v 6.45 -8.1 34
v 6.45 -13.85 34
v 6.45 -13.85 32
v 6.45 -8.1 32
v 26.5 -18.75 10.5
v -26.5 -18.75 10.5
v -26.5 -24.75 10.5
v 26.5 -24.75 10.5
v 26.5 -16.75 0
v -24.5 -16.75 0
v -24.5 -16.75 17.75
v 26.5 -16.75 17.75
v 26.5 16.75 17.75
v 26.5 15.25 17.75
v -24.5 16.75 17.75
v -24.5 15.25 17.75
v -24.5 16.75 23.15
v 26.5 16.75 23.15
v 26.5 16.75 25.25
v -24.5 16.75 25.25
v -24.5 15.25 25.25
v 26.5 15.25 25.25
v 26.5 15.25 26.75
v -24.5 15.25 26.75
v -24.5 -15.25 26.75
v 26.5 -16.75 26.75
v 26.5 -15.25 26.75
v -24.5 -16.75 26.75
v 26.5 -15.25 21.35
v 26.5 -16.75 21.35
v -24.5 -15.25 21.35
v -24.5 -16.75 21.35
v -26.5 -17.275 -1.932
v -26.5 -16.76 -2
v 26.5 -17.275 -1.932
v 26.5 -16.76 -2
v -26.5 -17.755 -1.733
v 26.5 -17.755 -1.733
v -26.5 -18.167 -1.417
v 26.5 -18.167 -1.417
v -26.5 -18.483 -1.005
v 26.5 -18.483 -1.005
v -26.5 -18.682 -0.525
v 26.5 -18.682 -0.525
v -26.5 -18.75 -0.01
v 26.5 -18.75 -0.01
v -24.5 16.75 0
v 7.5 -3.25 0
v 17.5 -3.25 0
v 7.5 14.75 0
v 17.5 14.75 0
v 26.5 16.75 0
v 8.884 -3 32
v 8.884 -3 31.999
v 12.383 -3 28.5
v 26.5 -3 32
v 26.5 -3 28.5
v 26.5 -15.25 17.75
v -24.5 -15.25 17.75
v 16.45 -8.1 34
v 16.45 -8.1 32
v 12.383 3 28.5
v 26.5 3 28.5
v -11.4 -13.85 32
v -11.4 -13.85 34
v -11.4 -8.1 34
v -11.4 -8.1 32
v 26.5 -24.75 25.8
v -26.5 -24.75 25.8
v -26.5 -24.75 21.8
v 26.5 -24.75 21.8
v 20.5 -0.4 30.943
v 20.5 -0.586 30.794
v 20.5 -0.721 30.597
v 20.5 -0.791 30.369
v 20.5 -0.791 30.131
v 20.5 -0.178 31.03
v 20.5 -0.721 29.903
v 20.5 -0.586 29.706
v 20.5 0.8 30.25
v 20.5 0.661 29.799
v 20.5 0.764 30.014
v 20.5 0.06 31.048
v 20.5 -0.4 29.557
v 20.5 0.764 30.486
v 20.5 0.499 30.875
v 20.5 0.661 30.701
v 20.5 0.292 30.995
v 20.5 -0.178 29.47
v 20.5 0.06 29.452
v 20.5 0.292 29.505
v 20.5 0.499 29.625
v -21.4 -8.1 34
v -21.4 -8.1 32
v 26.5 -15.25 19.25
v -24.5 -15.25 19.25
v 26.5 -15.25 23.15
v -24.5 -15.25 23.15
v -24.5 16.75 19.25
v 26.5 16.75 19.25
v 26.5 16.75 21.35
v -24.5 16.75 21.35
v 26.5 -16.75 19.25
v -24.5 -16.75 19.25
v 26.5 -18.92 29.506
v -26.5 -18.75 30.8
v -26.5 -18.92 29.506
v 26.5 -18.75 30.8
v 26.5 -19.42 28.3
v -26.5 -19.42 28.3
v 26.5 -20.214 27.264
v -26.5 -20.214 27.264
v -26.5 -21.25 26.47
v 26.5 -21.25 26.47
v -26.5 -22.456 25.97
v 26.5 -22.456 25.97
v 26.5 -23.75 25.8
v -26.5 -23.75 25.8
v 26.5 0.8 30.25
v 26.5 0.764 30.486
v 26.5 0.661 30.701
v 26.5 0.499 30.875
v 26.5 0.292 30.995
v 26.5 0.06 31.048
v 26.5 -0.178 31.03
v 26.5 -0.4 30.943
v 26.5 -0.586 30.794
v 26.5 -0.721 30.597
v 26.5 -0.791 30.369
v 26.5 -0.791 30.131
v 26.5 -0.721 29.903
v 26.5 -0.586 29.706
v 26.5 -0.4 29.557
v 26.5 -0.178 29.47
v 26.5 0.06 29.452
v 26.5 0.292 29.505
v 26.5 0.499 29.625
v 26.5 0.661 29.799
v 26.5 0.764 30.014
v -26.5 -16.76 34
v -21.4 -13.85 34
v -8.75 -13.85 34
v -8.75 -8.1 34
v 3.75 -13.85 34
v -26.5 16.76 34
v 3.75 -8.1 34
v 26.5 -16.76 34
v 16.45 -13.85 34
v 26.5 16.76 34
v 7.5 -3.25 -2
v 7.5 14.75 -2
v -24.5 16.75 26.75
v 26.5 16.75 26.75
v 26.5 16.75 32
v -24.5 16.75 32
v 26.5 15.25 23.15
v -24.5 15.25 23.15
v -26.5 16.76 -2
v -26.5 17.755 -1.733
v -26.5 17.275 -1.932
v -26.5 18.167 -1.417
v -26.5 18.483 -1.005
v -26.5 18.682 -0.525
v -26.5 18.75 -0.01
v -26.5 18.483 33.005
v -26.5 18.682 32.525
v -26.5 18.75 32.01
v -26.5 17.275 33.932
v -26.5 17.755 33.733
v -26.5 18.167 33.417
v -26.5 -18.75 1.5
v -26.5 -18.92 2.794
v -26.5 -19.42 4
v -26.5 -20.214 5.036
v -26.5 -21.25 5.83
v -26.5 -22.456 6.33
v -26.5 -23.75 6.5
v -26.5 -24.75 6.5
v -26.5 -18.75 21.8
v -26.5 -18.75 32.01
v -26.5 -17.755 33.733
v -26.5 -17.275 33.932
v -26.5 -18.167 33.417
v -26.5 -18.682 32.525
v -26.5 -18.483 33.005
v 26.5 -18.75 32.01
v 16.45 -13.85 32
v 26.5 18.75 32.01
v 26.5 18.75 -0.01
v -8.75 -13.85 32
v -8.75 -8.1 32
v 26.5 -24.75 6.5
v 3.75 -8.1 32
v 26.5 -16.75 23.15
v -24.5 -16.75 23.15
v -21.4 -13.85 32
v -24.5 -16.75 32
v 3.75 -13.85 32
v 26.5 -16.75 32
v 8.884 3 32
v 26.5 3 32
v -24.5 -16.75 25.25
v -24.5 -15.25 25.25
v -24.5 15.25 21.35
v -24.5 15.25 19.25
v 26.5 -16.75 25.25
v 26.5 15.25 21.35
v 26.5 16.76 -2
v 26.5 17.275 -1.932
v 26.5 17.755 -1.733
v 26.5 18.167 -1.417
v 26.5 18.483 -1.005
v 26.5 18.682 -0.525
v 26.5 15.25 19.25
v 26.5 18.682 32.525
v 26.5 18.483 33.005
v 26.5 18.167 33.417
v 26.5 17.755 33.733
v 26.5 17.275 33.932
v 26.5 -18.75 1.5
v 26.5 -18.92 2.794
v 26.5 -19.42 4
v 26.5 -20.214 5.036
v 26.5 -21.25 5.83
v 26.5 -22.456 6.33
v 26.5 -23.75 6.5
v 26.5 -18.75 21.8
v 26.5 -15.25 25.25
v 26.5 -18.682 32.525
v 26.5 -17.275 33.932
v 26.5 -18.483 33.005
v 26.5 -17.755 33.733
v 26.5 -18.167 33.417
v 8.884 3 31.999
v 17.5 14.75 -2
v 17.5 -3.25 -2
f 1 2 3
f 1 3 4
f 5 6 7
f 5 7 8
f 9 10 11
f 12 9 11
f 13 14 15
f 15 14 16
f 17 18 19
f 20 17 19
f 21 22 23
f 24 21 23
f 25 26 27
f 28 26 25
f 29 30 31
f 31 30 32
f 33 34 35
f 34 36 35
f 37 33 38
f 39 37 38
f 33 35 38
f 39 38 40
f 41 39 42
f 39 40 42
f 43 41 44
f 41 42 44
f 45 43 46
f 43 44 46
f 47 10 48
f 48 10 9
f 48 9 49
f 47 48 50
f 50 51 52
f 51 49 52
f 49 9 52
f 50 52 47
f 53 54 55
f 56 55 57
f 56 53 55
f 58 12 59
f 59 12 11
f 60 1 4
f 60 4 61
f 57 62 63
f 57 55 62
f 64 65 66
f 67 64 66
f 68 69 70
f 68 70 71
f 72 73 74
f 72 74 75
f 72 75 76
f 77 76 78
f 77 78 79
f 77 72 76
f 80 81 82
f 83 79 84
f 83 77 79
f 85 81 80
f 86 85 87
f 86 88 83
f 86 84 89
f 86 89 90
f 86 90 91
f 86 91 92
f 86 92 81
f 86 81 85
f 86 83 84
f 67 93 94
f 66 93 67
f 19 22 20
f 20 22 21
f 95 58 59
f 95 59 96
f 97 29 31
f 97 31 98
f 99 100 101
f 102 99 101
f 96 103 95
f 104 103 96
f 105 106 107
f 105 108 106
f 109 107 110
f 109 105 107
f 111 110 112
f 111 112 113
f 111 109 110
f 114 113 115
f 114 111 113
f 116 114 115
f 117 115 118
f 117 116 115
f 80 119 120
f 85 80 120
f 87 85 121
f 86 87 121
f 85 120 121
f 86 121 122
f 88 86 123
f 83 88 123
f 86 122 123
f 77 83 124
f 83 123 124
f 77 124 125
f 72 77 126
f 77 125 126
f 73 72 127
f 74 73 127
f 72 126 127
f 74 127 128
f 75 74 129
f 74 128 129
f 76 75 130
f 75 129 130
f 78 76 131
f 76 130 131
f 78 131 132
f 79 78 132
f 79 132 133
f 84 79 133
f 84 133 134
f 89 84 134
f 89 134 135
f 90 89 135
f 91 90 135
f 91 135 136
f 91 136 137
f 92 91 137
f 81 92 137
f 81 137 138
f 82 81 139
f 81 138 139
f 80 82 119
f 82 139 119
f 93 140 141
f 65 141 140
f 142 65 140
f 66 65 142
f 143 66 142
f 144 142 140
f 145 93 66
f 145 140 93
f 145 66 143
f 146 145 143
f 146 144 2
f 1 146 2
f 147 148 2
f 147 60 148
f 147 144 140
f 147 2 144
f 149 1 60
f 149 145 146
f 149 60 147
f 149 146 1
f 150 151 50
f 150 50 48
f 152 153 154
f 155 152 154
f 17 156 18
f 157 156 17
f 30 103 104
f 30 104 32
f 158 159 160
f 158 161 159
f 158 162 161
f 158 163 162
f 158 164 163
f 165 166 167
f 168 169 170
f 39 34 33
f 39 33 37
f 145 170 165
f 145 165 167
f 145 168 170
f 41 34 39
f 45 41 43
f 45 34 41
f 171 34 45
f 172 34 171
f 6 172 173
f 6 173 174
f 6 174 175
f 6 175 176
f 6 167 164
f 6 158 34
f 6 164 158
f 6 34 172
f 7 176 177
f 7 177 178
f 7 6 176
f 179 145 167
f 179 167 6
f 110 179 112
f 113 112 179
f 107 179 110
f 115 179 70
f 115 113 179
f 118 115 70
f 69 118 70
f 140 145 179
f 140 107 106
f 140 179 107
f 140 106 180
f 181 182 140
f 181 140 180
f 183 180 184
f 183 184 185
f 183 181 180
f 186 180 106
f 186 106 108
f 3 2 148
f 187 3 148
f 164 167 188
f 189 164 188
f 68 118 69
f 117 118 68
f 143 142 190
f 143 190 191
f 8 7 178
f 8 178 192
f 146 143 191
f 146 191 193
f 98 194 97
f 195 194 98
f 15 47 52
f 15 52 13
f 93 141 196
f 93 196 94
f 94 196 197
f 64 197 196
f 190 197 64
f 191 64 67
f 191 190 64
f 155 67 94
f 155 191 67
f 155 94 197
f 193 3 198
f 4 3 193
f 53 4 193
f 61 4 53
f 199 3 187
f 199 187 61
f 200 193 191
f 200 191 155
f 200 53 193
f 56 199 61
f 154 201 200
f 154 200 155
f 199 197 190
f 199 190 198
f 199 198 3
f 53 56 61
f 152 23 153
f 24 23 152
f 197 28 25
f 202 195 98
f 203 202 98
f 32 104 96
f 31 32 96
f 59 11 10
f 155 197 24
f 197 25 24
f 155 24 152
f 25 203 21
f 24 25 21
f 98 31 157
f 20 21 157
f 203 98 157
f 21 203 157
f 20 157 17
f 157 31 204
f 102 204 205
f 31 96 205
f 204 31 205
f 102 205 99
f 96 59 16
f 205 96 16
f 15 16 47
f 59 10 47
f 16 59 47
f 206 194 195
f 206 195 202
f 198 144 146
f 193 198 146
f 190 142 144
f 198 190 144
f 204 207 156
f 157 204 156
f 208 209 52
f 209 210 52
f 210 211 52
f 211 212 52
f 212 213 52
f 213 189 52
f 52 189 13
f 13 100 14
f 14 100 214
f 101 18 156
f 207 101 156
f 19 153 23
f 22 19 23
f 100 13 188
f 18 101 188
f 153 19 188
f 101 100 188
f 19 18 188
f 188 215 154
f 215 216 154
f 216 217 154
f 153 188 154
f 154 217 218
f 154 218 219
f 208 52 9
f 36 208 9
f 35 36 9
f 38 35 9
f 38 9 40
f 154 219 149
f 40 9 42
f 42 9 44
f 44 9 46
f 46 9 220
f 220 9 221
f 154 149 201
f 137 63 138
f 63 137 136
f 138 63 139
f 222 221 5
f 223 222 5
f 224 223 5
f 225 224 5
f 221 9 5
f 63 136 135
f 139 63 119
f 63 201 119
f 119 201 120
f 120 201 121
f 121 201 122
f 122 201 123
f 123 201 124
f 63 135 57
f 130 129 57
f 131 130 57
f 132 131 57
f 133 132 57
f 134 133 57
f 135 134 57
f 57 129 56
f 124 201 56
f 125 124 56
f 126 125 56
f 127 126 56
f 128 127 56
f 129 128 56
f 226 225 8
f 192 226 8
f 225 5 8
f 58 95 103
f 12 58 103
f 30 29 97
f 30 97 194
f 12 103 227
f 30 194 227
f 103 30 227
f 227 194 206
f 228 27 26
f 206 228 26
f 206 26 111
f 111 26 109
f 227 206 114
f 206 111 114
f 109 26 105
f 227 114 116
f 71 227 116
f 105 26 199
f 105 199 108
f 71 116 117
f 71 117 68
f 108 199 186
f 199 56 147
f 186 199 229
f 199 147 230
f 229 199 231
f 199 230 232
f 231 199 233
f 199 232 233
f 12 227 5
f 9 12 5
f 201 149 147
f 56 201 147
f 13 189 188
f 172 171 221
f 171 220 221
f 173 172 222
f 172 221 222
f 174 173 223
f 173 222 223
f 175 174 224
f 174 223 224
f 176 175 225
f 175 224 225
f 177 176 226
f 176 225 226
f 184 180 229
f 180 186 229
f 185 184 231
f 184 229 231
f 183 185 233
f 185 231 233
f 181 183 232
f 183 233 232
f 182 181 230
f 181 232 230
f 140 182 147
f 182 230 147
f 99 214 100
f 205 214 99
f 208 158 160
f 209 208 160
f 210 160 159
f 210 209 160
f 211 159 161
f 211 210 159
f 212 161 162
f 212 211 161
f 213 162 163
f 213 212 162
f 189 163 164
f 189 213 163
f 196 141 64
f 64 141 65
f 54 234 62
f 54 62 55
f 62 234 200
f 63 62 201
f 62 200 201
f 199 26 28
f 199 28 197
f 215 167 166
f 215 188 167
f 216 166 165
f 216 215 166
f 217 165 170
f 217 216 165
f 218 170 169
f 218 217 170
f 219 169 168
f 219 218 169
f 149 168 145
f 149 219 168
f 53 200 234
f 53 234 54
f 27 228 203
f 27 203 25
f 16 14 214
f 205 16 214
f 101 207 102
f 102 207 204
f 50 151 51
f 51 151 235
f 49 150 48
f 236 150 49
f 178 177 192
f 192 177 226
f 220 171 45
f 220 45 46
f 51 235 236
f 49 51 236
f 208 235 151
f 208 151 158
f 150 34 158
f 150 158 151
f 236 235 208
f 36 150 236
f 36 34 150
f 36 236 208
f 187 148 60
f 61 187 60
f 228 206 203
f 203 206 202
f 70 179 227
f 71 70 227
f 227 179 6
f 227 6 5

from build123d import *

# Parameters (mm, degrees)
SKETCH_W        = 53
SKETCH_H        = 37.5
SKETCH_W_2      = 49
SKETCH_H_2      = 33.5
PAD_DEPTH       = 32
SKETCH001_W     = 53
SKETCH001_H     = 37.5
PAD001_DEPTH    = 2
SKETCH002_W     = 53
SKETCH002_H     = 37.5
PAD002_DEPTH    = 2
SKETCH003_W     = 33.5
SKETCH003_H     = 32
POCKET_DEPTH    = 2
SKETCH004_W     = 10
SKETCH004_H     = 5.75
SKETCH004_W_2   = 12.5
SKETCH004_W_3   = 9.9999999999
POCKET001_DEPTH = 5
SKETCH005_W     = 51
SKETCH005_H     = 1.8
SKETCH005_H_2   = 1.5
PAD003_DEPTH    = 33.5
SKETCH006_W     = 30.5
SKETCH006_H     = 9
POCKET002_DEPTH = 51
SKETCH007_W     = 17.616245
SKETCH007_H     = 6
PAD004_DEPTH    = 5
SKETCH008_R     = 0.8
POCKET003_DEPTH = 5
SKETCH009_W     = 17.616245
SKETCH009_H     = 6
PAD005_DEPTH    = 3.5
SKETCH010_R     = 0.8
POCKET004_DEPTH = 6
CHAMFER_SIZE    = 3.499
CHAMFER001_SIZE = 4.99
FILLET_R        = 1.99
SKETCH012_W     = 53
SKETCH012_H     = 4
PAD006_DEPTH    = 6
FILLET001_R     = 5
SKETCH013_W     = 6
SKETCH013_H     = 5
POCKET005_DEPTH = 20
SKETCH014_W     = 10
SKETCH014_H     = 18
POCKET006_DEPTH = 5


with BuildPart() as part:
    # Sketch → Pad (new body)
    with BuildSketch(Plane.XY):
        Rectangle(SKETCH_W, SKETCH_H)
        Rectangle(SKETCH_W_2, SKETCH_H_2, mode=Mode.SUBTRACT)
    extrude(amount=PAD_DEPTH)

    # Sketch001 (on Face10 of Pad) → Pad001 (join)
    with BuildSketch(Plane.XY.offset(32)):
        Rectangle(SKETCH001_W, SKETCH001_H)
    extrude(amount=PAD001_DEPTH)

    # Sketch002 (on Face4 of Pad001) → Pad002 (join)
    with BuildSketch(Plane(origin=(0, 0, 0), x_dir=(1, 0, 0), z_dir=(0, 0, -1))):
        Rectangle(SKETCH002_W, SKETCH002_H)
    extrude(amount=PAD002_DEPTH)

    # Sketch003 (on Face3 of Pad002) → Pocket (cut)
    with BuildSketch(Plane.YZ.offset(26.5)):
        with Locations((0, 16)):
            Rectangle(SKETCH003_W, SKETCH003_H)
    extrude(amount=-POCKET_DEPTH, mode=Mode.SUBTRACT)

    # Sketch004 (on Face13 of Pocket) → Pocket001 (cut)
    with BuildSketch(Plane.XY.offset(34)):
        with Locations((-16.4, -10.975)):
            Rectangle(SKETCH004_W, SKETCH004_H)
        with Locations((-2.5, -10.975)):
            Rectangle(SKETCH004_W_2, SKETCH004_H)
        with Locations((11.45, -10.975)):
            Rectangle(SKETCH004_W_3, SKETCH004_H)
    extrude(amount=-POCKET001_DEPTH, mode=Mode.SUBTRACT)

    # Sketch005 (on Face36 of Pocket001) → Pad003 (join)
    with BuildSketch(Plane(origin=(0, -16.75, 0), x_dir=(-1, 0, 0), z_dir=(0, 1, 0))):
        with Locations((-1, 22.25)):
            Rectangle(SKETCH005_W, SKETCH005_H)
        with Locations((-1, 26)):
            Rectangle(SKETCH005_W, SKETCH005_H_2)
        with Locations((-1, 18.5)):
            Rectangle(SKETCH005_W, SKETCH005_H_2)
    extrude(amount=PAD003_DEPTH)

    # Sketch006 (on Face11 of Pad003) → Pocket002 (cut)
    with BuildSketch(Plane.YZ.offset(26.5)):
        with Locations((0, 22.25)):
            Rectangle(SKETCH006_W, SKETCH006_H)
    extrude(amount=-POCKET002_DEPTH, mode=Mode.SUBTRACT)

    # Sketch007 (on Face57 of Pocket002) → Pad004 (join)
    with BuildSketch(Plane.XY):
        with Locations((17.6918775, 0)):
            Rectangle(SKETCH007_W, SKETCH007_H)
    extrude(amount=PAD004_DEPTH)

    # Sketch008 (on Face24 of Pad004) → Pocket003 (cut)
    with BuildSketch(Plane.YZ.offset(26.5)):
        with Locations((0, 2.5)):
            Circle(SKETCH008_R)
    extrude(amount=-POCKET003_DEPTH, mode=Mode.SUBTRACT)

    # Sketch009 (on Face65 of Pocket003) → Pad005 (join)
    with BuildSketch(Plane(origin=(0, 0, 32), x_dir=(1, 0, 0), z_dir=(0, 0, -1))):
        with Locations((17.6918775, 0)):
            Rectangle(SKETCH009_W, SKETCH009_H)
    extrude(amount=PAD005_DEPTH)

    # Sketch010 (on Face41 of Pad005) → Pocket004 (cut)
    with BuildSketch(Plane.YZ.offset(26.5)):
        with Locations((0, 30.25)):
            Circle(SKETCH010_R)
    extrude(amount=-POCKET004_DEPTH, mode=Mode.SUBTRACT)

    # Chamfer
    chamfer_edges = [part.edges().sort_by_distance(p)[0] for p in [
        (8.883755, 0, 28.5),
    ]]
    chamfer(chamfer_edges, length=CHAMFER_SIZE)

    # Chamfer001
    chamfer001_edges = [part.edges().sort_by_distance(p)[0] for p in [
        (8.883755, 0, 5),
    ]]
    chamfer(chamfer001_edges, length=CHAMFER001_SIZE)

    # Fillet
    fillet_edges = [part.edges().sort_by_distance(p)[0] for p in [
        (0, -18.75, 34),
        (0, 18.75, 34),
        (0, 18.75, -2),
        (0, -18.75, -2),
    ]]
    fillet(fillet_edges, radius=FILLET_R)

    # Sketch012 → Pad006 (join)
    with BuildSketch(Plane.XZ.offset(18.75)):
        with Locations((0, 23.8)):
            Rectangle(SKETCH012_W, SKETCH012_H)
        with Locations((0, 8.5)):
            Rectangle(SKETCH012_W, SKETCH012_H)
    extrude(amount=PAD006_DEPTH)

    # Fillet001
    fillet001_edges = [part.edges().sort_by_distance(p)[0] for p in [
        (0, -18.75, 6.5),
        (0, -18.75, 25.8),
    ]]
    fillet(fillet001_edges, radius=FILLET001_R)

    # Sketch013 (on Face26 of Fillet001) → Pocket005 (cut)
    with BuildSketch(Plane.YZ.offset(26.5)):
        with Locations((0, 2.5)):
            Rectangle(SKETCH013_W, SKETCH013_H)
    extrude(amount=-POCKET005_DEPTH, mode=Mode.SUBTRACT)

    # Sketch014 (on Face23 of Pocket005) → Pocket006 (cut)
    with BuildSketch(Plane(origin=(0, 0, -2), x_dir=(1, 0, 0), z_dir=(0, 0, -1))):
        with Locations((12.5, -5.75)):
            Rectangle(SKETCH014_W, SKETCH014_H)
    extrude(amount=-POCKET006_DEPTH, mode=Mode.SUBTRACT)


solid = part.part
